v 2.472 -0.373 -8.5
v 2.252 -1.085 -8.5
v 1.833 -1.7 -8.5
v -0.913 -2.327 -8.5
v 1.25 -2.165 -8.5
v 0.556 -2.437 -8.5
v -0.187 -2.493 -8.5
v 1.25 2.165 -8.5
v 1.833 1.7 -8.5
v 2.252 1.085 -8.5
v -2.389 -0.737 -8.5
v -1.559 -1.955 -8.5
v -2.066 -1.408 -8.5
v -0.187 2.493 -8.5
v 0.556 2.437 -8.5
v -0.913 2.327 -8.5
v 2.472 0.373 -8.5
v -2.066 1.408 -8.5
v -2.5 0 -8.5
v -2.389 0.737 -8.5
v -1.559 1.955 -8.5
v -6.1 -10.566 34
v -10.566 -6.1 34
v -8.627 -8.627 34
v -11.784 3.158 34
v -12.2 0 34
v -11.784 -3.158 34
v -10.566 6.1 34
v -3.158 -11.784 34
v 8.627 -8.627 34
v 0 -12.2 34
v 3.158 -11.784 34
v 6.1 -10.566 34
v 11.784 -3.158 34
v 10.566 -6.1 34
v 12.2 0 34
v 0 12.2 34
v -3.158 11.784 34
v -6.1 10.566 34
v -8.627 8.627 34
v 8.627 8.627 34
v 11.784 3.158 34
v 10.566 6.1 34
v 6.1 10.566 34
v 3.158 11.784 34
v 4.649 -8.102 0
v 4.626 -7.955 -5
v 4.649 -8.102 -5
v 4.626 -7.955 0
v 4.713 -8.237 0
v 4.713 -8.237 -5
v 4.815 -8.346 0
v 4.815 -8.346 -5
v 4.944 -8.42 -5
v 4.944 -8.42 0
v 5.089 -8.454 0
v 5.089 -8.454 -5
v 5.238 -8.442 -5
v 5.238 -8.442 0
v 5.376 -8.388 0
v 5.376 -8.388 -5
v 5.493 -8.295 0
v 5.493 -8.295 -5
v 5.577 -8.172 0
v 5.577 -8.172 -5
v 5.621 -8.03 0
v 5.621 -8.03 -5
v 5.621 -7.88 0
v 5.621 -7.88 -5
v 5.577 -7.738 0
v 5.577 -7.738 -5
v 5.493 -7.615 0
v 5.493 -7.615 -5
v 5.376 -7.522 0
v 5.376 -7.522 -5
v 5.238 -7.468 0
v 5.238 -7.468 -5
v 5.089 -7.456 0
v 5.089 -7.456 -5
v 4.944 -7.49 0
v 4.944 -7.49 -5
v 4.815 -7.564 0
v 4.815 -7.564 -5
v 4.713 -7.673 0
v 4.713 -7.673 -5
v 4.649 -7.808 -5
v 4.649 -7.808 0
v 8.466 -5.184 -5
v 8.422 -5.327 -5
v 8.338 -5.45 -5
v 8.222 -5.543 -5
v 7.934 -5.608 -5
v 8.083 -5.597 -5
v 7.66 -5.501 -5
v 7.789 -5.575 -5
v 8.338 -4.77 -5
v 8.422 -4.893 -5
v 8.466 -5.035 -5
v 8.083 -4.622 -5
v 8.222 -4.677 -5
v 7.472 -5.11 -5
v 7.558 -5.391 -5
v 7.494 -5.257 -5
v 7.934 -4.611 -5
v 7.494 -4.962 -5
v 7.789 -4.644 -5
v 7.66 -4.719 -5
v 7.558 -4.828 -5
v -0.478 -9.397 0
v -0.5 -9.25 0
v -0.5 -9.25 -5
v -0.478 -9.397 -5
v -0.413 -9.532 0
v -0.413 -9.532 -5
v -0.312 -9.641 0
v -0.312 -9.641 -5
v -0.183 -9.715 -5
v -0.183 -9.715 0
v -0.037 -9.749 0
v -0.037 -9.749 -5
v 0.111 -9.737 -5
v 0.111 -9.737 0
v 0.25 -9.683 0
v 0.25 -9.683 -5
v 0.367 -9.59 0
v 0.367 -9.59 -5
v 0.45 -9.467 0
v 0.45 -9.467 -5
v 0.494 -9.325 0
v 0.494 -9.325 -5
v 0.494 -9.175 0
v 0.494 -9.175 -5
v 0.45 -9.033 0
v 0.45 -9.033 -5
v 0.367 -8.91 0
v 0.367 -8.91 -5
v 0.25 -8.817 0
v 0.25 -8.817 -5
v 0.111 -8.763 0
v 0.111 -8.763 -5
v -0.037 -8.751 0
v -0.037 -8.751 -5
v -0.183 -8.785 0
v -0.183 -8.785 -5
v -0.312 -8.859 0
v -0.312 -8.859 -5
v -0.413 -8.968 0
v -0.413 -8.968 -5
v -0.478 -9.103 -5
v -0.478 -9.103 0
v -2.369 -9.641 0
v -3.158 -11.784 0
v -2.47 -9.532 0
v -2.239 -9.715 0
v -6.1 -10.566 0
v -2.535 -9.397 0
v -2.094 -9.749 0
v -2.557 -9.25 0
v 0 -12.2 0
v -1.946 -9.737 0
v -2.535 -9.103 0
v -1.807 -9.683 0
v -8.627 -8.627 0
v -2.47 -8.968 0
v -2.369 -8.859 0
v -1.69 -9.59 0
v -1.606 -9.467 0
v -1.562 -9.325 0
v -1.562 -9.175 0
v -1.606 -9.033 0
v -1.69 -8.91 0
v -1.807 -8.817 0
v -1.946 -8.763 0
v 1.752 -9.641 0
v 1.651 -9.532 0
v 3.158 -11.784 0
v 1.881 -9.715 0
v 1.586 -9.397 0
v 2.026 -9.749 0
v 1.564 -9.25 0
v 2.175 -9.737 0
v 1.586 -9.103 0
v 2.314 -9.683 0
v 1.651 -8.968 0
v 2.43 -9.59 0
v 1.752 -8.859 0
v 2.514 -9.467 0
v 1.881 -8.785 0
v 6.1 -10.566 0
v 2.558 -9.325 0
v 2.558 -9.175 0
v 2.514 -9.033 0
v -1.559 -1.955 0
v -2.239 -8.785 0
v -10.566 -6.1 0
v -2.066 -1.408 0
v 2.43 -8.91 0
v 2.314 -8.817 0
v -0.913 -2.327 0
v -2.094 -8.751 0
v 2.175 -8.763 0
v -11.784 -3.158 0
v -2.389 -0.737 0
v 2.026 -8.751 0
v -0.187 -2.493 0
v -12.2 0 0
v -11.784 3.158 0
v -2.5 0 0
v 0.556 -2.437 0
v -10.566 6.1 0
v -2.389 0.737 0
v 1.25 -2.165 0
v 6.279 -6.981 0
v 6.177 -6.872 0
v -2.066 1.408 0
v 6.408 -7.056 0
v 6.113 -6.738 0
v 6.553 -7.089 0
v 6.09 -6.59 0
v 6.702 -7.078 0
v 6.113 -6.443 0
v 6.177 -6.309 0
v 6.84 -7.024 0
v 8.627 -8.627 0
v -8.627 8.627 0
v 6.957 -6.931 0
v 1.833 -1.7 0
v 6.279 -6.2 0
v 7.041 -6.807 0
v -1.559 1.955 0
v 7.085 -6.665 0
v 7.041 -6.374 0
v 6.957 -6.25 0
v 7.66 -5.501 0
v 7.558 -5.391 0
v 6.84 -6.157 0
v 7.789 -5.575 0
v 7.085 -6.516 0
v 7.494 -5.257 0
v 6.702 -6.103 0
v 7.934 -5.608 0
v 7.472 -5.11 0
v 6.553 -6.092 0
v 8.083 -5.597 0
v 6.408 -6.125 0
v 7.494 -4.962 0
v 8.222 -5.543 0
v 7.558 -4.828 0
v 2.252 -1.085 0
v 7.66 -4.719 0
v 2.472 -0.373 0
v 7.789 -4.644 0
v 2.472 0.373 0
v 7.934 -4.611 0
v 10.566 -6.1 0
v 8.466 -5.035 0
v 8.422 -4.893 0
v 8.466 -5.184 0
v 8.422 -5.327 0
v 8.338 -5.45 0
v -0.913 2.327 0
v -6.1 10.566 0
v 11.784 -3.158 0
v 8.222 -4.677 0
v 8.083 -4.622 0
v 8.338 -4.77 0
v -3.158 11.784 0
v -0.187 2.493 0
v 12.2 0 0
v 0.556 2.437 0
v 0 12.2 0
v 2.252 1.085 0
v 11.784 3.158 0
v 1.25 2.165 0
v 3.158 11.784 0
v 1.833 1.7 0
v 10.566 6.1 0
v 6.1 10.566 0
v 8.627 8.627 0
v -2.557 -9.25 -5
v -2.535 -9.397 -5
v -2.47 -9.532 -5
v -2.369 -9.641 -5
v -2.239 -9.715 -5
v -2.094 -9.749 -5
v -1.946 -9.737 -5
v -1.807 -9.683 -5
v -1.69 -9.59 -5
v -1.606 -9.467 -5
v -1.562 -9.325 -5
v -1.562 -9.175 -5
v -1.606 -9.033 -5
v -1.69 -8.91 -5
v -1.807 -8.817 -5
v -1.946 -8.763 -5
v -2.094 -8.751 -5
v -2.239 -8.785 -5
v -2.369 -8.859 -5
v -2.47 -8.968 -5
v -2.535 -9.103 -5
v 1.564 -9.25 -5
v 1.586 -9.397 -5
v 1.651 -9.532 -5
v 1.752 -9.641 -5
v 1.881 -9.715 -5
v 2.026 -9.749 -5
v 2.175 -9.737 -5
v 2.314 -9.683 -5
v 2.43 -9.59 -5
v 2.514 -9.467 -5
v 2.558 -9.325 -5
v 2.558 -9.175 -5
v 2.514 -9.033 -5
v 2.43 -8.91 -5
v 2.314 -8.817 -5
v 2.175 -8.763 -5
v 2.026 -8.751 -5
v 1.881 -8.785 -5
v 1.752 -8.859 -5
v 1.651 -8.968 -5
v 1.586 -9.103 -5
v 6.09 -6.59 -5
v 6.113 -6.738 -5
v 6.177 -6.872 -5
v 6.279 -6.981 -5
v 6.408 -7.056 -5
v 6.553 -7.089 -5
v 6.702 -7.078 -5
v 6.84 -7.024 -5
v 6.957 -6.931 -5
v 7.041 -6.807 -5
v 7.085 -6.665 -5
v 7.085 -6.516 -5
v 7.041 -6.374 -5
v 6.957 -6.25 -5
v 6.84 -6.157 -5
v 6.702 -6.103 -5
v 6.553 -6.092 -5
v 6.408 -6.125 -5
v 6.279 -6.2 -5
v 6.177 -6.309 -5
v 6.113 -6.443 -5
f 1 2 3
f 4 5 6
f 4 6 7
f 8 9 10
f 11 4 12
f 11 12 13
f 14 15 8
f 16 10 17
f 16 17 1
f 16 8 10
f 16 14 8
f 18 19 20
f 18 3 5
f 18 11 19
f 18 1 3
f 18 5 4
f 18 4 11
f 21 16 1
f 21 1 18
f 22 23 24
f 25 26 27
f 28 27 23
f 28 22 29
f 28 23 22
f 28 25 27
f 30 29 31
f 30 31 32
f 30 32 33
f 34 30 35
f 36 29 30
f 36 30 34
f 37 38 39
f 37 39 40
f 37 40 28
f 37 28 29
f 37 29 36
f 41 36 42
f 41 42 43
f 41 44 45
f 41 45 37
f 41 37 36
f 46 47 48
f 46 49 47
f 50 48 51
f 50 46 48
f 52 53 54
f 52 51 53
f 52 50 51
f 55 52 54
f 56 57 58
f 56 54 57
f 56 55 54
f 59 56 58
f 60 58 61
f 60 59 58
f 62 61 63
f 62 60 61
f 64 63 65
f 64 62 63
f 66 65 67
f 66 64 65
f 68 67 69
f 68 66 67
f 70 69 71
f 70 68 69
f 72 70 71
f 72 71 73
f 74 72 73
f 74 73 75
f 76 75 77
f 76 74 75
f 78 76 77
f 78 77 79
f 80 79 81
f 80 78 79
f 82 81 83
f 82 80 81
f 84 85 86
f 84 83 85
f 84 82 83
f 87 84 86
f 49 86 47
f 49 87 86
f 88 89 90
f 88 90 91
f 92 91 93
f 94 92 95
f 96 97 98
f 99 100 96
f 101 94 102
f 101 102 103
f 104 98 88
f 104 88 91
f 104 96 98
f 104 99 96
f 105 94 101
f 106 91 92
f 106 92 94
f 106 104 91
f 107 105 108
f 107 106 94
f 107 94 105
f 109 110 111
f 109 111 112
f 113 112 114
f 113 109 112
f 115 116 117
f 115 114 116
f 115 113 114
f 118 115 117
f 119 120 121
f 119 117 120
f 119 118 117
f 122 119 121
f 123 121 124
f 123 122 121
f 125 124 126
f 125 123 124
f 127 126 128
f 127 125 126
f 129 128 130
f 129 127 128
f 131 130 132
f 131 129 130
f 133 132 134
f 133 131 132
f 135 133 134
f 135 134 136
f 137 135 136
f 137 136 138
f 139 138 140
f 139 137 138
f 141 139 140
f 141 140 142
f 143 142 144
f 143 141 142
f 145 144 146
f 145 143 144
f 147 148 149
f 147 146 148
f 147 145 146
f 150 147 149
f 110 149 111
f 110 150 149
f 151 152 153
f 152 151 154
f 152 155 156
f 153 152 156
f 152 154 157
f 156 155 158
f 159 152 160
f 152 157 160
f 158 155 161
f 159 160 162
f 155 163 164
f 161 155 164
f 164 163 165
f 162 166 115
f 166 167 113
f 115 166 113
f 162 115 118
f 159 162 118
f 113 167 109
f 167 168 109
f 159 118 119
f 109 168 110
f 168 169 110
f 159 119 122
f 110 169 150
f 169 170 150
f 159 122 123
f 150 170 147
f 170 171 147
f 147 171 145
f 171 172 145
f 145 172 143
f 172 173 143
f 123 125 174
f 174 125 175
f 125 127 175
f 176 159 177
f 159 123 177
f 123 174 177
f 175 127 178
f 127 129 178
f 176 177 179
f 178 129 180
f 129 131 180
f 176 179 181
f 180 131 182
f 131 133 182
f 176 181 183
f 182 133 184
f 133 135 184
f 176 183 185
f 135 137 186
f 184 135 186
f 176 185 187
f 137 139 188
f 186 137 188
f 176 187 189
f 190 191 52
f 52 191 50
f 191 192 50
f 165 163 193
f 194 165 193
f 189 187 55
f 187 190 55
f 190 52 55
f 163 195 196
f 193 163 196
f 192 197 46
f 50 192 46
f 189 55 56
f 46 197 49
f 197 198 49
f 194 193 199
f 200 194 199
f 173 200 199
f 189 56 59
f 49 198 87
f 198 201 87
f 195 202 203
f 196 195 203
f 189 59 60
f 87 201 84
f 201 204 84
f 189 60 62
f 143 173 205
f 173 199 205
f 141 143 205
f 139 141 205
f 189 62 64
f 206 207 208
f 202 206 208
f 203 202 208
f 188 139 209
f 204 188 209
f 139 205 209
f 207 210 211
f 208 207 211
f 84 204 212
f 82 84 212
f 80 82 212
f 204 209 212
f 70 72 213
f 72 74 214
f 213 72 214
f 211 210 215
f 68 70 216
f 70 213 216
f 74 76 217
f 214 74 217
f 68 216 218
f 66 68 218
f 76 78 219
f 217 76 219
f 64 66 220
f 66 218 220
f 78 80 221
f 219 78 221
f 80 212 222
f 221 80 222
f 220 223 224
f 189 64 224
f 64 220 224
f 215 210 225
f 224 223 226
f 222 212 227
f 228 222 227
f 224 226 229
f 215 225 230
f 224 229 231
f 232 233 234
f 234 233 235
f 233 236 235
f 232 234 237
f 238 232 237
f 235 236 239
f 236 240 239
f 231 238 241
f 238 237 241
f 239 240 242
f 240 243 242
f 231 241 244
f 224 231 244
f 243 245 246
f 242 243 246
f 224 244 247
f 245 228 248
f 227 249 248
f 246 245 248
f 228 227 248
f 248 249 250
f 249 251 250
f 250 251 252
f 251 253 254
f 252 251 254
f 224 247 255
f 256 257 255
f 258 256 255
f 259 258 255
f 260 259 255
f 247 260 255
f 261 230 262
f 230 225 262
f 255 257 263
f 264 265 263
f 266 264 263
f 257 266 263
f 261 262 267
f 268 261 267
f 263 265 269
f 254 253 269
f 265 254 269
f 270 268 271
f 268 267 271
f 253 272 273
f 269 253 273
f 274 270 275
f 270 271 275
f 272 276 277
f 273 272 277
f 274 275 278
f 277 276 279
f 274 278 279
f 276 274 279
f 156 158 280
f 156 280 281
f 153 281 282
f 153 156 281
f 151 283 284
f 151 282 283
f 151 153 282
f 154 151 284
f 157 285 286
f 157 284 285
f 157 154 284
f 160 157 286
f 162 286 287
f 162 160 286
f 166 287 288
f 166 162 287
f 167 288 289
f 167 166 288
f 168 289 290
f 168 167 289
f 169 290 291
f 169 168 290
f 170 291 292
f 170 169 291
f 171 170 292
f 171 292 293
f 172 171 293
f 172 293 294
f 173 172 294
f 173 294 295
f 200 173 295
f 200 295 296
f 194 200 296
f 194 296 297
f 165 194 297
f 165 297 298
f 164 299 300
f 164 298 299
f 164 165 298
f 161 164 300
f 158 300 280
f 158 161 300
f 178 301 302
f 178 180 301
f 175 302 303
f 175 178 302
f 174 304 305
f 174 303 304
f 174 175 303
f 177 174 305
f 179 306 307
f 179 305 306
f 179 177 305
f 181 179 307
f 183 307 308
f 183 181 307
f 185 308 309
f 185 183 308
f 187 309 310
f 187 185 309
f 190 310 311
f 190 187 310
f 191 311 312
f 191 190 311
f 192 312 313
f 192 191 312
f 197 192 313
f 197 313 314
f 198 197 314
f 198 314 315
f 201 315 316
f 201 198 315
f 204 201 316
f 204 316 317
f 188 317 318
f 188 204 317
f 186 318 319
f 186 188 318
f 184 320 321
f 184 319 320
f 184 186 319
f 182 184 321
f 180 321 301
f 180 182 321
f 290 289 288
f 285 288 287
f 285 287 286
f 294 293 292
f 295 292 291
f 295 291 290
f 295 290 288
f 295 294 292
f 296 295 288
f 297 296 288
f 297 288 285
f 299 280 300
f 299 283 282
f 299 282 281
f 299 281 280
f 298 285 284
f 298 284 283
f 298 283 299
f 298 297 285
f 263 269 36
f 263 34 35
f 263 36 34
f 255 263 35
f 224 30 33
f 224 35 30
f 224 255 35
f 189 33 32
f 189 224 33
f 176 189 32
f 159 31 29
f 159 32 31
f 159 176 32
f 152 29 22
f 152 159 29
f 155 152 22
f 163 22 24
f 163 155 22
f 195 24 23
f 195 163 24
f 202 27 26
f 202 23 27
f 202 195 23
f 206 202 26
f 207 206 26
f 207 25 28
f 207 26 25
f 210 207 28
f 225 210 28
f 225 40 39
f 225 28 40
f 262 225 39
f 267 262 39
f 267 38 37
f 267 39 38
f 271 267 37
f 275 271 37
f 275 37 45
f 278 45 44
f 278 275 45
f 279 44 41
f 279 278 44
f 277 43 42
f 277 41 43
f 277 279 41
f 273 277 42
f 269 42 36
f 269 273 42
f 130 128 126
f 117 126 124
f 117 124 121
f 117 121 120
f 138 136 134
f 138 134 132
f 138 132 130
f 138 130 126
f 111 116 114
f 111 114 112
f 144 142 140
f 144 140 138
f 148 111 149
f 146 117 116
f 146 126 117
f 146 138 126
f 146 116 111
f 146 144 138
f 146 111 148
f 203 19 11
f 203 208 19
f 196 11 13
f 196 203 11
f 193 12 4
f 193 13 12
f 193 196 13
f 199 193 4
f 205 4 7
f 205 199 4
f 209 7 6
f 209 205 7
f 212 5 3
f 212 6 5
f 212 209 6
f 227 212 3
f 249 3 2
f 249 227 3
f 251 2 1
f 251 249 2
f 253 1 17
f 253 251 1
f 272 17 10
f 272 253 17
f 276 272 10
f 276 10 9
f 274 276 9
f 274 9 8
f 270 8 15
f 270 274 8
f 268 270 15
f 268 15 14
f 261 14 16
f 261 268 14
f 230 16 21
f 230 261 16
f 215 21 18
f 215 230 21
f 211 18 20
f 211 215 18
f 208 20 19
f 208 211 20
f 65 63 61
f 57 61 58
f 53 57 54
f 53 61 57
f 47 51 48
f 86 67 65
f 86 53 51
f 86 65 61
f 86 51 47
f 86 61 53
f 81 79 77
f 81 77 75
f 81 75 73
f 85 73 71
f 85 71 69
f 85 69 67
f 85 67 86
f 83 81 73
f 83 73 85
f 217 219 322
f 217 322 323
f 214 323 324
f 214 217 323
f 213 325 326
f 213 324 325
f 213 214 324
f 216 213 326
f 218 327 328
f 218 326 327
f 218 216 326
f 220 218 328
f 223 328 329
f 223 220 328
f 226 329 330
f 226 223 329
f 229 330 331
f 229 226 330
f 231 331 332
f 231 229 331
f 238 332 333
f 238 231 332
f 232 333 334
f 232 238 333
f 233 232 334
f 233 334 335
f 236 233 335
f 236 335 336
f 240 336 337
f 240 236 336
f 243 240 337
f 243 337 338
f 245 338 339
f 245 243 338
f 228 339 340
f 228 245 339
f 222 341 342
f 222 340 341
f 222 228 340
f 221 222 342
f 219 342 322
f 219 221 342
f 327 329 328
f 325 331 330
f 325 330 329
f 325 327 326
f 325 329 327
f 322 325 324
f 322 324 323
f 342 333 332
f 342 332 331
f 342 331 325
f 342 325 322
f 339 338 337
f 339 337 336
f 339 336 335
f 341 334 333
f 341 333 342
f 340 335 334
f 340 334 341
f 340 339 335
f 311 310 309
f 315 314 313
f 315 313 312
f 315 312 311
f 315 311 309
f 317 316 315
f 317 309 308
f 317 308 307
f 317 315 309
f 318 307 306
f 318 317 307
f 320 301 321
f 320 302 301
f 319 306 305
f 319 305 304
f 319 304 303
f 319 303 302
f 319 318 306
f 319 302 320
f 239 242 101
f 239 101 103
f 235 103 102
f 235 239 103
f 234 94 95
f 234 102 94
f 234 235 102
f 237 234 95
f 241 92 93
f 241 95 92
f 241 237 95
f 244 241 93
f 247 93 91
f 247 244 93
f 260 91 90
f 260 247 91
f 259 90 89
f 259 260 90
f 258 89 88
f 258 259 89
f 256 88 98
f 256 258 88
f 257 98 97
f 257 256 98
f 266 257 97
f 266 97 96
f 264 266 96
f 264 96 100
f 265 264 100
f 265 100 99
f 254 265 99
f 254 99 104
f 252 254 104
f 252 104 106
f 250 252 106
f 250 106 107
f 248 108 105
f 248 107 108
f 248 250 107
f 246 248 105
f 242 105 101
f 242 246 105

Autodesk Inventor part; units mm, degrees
ref_plane "YZ Plane" through (0, 0, 0) normal (1, 0, 0) x (0, 1, 0)
ref_plane "XZ Plane" through (0, 0, 0) normal (0, 1, 0) x (-1, 0, 0)
ref_plane "XY Plane" through (0, 0, 0) normal (0, 0, 1) x (1, 0, 0)
sketch "Sketch1" plane through (0, 0, 0) normal (0, 0, 1) x (1, 0, 0)
  circle A0 centre (0, 0) radius 12.2
  dimension "d0" = 24.4
extrude "Extrusion1" add sketch "Sketch1" along normal blind 34
sketch "Sketch2" plane through (0, 0, 0) normal (0, 0, -1) x (-1, 0, 0)
  circle A0 centre (0, 0) radius 2.5
  dimension "d3" = 5
extrude "Extrusion2" add sketch "Sketch2" along normal blind 8.5
sketch "Sketch3" plane through (0, 0, 0) normal (0, 0, -1) x (-1, 0, 0)
  line L0 (-3.25, -8) -> (3.25, -8) construction
  line L1 (3.25, -8) -> (3.25, -10.5) construction
  line L2 (3.25, -10.5) -> (-3.25, -10.5) construction
  line L3 (-3.25, -10.5) -> (-3.25, -8) construction
  line L4 (0, 0) -> (-3.25, -8) construction
  line L5 (3.25, -8) -> (0, 0) construction
  line L6 (0, 0) -> (0, -8) construction
  line L7 (-7.955, -3.3588) -> (-3.3588, -7.955) construction
  line L8 (-3.3588, -7.955) -> (-5.1265, -9.7227) construction
  line L9 (-5.1265, -9.7227) -> (-9.7227, -5.1265) construction
  line L10 (-9.7227, -5.1265) -> (-7.955, -3.3588) construction
  line L11 (0, 0) -> (-7.955, -3.3588) construction
  line L12 (-3.3588, -7.955) -> (0, 0) construction
  line L13 (0, 0) -> (-5.6569, -5.6569) construction
  circle A0 centre (-2.0637, -9.25) radius 0.5
  circle A1 centre (2.0568, -9.25) radius 0.5
  circle A2 centre (0, -9.25) radius 0.5
  circle A3 centre (-6.5905, -6.5905) radius 0.5
  circle A4 centre (-5.1265, -7.955) radius 0.5
  circle A5 centre (-7.9716, -5.1098) radius 0.5
  dimension "d6" = 2.5
  dimension "d7" = 6.5
  dimension "d8" = 8
  dimension "d9" = 2.5
  dimension "d10" = 6.5
  dimension "d11" = 8
  dimension "d12" = 45
  dimension "d13" = 1
  dimension "d14" = 1
  dimension "d15" = 1
  dimension "d18" = 1
  dimension "d19" = 1
  dimension "d20" = 1
extrude "Extrusion3" add sketch "Sketch3" along normal blind 5 contours A0 | A1 | A2
extrude "Extrusion4" add sketch "Sketch3" along normal blind 5 contours A3 | A4 | A5
properties part number "motor_body"
